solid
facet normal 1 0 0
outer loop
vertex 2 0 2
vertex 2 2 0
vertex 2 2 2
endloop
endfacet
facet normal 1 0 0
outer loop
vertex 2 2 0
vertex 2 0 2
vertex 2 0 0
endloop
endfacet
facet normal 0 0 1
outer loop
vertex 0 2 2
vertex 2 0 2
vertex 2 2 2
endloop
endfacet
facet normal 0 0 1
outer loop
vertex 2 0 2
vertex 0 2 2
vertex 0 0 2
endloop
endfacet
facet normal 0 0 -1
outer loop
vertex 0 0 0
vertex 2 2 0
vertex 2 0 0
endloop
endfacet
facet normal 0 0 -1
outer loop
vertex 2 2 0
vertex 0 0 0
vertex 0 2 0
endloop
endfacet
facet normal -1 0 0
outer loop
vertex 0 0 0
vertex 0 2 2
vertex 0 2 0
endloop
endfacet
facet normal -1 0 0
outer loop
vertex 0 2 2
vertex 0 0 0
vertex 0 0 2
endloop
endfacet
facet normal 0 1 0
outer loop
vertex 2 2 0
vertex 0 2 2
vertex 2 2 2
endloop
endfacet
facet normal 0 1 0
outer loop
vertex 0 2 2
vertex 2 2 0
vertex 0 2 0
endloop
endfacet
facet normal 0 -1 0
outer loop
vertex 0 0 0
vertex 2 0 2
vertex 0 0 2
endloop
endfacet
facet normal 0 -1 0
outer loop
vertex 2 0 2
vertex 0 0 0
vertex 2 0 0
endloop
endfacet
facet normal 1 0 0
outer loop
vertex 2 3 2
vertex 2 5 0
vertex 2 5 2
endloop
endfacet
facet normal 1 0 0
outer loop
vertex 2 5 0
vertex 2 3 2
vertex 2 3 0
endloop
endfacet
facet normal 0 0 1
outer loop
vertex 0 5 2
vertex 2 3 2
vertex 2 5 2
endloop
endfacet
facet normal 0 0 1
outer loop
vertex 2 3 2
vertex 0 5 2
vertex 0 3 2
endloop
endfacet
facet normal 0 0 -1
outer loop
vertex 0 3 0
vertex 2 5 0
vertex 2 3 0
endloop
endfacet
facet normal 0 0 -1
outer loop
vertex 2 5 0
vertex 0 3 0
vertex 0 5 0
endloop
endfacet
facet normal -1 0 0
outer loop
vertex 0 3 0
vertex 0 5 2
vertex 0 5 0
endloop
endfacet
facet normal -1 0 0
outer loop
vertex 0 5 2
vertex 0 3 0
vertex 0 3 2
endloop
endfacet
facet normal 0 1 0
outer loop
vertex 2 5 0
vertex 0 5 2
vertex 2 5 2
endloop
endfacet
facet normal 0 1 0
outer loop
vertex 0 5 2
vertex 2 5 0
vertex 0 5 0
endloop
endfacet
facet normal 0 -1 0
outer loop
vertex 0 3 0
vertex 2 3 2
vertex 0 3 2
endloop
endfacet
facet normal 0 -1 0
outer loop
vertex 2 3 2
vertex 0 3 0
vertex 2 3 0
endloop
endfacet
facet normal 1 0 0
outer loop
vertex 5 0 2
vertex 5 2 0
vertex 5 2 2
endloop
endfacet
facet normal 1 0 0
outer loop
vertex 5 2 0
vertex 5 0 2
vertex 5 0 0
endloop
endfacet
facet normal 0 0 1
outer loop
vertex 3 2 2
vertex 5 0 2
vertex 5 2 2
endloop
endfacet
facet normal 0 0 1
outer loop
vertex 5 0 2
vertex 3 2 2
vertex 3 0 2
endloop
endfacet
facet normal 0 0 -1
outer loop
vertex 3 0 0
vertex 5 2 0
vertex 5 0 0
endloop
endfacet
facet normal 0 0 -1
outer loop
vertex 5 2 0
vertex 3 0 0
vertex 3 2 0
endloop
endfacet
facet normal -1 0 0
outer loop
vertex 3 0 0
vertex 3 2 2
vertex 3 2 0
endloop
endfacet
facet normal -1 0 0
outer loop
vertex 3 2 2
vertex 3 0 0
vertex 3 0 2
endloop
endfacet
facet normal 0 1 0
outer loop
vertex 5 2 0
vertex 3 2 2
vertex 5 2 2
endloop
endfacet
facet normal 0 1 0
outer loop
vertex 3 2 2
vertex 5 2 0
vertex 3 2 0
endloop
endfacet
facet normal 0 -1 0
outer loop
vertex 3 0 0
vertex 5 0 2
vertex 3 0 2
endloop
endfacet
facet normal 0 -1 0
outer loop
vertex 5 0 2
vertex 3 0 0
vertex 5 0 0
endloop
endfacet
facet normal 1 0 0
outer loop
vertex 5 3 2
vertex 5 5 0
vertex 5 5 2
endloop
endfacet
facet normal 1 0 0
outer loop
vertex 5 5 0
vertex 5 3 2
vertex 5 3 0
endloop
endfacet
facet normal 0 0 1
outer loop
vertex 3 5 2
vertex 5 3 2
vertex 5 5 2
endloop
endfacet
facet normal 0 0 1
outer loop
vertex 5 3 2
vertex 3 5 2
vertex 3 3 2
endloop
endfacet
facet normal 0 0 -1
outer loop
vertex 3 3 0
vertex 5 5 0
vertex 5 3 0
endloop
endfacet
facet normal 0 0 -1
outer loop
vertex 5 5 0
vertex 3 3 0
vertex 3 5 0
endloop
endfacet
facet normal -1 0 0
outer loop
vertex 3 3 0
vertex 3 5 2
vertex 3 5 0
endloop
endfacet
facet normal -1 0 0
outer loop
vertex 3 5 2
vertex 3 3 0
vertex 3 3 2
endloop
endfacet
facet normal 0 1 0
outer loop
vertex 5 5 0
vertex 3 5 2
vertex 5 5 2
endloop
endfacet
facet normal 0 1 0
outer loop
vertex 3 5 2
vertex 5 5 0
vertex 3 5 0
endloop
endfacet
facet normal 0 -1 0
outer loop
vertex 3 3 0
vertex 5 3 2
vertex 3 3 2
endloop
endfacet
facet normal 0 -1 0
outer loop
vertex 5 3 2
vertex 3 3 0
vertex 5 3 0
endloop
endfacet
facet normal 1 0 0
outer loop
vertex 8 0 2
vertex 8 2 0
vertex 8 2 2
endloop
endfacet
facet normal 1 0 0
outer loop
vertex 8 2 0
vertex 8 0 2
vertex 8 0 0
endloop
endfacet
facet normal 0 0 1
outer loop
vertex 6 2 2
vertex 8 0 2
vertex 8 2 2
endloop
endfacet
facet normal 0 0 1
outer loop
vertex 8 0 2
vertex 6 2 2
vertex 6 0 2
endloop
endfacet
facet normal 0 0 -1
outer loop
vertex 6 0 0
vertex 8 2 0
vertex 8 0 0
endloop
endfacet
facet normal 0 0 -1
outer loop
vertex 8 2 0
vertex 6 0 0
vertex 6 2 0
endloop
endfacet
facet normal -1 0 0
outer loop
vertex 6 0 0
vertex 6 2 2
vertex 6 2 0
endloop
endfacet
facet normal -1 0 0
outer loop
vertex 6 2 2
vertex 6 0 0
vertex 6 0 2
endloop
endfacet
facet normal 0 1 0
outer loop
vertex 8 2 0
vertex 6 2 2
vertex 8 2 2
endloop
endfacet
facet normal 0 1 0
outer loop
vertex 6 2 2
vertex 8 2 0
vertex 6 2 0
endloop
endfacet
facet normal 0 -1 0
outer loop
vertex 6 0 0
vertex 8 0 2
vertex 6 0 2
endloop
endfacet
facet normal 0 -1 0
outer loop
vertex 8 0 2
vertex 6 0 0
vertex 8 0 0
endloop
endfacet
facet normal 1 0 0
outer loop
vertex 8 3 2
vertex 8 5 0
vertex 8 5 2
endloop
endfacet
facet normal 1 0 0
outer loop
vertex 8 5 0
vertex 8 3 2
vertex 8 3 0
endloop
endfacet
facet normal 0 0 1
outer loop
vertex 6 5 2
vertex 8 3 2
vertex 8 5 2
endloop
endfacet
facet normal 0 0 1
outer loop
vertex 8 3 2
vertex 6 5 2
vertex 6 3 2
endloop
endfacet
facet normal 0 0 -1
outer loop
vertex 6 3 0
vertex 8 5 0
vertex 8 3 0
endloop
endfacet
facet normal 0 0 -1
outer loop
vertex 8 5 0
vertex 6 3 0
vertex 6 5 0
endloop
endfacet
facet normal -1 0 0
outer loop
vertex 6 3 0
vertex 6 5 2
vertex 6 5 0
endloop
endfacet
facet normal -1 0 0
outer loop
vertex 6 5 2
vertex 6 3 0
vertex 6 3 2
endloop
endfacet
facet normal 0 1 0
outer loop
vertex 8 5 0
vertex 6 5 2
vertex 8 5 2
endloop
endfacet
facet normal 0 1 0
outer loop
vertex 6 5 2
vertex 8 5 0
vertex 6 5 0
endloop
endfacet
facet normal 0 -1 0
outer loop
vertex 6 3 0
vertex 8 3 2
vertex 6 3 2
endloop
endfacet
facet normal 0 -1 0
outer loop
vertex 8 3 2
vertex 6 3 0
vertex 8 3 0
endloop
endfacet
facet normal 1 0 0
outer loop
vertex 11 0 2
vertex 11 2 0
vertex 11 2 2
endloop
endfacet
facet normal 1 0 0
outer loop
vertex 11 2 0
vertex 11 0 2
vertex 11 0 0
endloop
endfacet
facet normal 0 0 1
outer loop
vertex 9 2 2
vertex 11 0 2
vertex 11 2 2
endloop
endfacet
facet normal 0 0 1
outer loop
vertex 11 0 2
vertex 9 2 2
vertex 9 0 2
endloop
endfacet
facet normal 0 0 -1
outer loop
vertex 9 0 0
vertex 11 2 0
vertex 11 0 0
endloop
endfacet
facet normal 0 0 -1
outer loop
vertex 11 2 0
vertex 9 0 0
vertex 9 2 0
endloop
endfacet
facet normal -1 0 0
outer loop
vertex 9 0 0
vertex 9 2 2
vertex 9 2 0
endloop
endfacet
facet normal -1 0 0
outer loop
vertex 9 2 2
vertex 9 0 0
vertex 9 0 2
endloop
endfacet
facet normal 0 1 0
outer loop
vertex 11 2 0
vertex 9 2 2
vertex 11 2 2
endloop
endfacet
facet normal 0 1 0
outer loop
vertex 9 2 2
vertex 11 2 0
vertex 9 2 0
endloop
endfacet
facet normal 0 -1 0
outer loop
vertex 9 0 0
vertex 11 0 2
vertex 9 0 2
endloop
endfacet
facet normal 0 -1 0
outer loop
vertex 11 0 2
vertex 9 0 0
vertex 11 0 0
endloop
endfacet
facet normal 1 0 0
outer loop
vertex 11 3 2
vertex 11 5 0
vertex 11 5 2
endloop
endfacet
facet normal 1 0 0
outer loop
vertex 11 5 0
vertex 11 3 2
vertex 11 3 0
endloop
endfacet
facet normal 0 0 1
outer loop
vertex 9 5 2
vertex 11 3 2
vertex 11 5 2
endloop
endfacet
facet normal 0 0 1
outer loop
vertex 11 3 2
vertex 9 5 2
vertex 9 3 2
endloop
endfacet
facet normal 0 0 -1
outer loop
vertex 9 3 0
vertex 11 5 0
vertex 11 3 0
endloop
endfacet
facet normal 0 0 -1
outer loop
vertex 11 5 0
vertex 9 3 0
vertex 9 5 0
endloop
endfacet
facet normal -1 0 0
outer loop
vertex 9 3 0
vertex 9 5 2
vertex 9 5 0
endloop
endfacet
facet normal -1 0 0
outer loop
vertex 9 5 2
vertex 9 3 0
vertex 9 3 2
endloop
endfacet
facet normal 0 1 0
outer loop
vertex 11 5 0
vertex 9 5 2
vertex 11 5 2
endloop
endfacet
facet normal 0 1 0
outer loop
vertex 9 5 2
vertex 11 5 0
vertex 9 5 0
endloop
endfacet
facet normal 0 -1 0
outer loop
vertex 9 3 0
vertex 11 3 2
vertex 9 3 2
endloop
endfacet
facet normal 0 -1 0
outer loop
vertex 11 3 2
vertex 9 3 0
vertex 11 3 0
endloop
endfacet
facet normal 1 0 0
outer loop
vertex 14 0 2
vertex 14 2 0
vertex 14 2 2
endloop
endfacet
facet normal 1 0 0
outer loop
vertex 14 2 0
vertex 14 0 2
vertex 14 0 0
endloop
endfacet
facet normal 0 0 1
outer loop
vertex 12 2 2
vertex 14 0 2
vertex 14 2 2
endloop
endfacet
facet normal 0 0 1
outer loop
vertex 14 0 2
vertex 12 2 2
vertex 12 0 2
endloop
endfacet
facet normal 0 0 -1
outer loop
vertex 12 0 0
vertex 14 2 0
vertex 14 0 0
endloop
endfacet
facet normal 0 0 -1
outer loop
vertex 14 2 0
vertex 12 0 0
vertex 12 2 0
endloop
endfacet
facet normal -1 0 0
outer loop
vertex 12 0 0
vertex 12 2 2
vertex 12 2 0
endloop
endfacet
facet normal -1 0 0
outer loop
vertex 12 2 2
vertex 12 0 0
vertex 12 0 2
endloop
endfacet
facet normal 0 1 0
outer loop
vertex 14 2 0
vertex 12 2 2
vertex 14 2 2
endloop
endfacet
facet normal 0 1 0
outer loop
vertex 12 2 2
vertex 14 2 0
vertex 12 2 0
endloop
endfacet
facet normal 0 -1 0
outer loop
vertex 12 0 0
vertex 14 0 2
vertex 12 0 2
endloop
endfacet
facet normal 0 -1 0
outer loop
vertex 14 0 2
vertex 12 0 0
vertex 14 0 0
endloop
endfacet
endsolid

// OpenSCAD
union() {
  for (ix = [0:4]) {
    for (iy = [0:1]) {
      if (!(ix == 4 && iy == 1)) {
        translate([ix * 3, iy * 3, 0]) cube(size=[2,2,2], center=false);
      }
    }
  }
}
